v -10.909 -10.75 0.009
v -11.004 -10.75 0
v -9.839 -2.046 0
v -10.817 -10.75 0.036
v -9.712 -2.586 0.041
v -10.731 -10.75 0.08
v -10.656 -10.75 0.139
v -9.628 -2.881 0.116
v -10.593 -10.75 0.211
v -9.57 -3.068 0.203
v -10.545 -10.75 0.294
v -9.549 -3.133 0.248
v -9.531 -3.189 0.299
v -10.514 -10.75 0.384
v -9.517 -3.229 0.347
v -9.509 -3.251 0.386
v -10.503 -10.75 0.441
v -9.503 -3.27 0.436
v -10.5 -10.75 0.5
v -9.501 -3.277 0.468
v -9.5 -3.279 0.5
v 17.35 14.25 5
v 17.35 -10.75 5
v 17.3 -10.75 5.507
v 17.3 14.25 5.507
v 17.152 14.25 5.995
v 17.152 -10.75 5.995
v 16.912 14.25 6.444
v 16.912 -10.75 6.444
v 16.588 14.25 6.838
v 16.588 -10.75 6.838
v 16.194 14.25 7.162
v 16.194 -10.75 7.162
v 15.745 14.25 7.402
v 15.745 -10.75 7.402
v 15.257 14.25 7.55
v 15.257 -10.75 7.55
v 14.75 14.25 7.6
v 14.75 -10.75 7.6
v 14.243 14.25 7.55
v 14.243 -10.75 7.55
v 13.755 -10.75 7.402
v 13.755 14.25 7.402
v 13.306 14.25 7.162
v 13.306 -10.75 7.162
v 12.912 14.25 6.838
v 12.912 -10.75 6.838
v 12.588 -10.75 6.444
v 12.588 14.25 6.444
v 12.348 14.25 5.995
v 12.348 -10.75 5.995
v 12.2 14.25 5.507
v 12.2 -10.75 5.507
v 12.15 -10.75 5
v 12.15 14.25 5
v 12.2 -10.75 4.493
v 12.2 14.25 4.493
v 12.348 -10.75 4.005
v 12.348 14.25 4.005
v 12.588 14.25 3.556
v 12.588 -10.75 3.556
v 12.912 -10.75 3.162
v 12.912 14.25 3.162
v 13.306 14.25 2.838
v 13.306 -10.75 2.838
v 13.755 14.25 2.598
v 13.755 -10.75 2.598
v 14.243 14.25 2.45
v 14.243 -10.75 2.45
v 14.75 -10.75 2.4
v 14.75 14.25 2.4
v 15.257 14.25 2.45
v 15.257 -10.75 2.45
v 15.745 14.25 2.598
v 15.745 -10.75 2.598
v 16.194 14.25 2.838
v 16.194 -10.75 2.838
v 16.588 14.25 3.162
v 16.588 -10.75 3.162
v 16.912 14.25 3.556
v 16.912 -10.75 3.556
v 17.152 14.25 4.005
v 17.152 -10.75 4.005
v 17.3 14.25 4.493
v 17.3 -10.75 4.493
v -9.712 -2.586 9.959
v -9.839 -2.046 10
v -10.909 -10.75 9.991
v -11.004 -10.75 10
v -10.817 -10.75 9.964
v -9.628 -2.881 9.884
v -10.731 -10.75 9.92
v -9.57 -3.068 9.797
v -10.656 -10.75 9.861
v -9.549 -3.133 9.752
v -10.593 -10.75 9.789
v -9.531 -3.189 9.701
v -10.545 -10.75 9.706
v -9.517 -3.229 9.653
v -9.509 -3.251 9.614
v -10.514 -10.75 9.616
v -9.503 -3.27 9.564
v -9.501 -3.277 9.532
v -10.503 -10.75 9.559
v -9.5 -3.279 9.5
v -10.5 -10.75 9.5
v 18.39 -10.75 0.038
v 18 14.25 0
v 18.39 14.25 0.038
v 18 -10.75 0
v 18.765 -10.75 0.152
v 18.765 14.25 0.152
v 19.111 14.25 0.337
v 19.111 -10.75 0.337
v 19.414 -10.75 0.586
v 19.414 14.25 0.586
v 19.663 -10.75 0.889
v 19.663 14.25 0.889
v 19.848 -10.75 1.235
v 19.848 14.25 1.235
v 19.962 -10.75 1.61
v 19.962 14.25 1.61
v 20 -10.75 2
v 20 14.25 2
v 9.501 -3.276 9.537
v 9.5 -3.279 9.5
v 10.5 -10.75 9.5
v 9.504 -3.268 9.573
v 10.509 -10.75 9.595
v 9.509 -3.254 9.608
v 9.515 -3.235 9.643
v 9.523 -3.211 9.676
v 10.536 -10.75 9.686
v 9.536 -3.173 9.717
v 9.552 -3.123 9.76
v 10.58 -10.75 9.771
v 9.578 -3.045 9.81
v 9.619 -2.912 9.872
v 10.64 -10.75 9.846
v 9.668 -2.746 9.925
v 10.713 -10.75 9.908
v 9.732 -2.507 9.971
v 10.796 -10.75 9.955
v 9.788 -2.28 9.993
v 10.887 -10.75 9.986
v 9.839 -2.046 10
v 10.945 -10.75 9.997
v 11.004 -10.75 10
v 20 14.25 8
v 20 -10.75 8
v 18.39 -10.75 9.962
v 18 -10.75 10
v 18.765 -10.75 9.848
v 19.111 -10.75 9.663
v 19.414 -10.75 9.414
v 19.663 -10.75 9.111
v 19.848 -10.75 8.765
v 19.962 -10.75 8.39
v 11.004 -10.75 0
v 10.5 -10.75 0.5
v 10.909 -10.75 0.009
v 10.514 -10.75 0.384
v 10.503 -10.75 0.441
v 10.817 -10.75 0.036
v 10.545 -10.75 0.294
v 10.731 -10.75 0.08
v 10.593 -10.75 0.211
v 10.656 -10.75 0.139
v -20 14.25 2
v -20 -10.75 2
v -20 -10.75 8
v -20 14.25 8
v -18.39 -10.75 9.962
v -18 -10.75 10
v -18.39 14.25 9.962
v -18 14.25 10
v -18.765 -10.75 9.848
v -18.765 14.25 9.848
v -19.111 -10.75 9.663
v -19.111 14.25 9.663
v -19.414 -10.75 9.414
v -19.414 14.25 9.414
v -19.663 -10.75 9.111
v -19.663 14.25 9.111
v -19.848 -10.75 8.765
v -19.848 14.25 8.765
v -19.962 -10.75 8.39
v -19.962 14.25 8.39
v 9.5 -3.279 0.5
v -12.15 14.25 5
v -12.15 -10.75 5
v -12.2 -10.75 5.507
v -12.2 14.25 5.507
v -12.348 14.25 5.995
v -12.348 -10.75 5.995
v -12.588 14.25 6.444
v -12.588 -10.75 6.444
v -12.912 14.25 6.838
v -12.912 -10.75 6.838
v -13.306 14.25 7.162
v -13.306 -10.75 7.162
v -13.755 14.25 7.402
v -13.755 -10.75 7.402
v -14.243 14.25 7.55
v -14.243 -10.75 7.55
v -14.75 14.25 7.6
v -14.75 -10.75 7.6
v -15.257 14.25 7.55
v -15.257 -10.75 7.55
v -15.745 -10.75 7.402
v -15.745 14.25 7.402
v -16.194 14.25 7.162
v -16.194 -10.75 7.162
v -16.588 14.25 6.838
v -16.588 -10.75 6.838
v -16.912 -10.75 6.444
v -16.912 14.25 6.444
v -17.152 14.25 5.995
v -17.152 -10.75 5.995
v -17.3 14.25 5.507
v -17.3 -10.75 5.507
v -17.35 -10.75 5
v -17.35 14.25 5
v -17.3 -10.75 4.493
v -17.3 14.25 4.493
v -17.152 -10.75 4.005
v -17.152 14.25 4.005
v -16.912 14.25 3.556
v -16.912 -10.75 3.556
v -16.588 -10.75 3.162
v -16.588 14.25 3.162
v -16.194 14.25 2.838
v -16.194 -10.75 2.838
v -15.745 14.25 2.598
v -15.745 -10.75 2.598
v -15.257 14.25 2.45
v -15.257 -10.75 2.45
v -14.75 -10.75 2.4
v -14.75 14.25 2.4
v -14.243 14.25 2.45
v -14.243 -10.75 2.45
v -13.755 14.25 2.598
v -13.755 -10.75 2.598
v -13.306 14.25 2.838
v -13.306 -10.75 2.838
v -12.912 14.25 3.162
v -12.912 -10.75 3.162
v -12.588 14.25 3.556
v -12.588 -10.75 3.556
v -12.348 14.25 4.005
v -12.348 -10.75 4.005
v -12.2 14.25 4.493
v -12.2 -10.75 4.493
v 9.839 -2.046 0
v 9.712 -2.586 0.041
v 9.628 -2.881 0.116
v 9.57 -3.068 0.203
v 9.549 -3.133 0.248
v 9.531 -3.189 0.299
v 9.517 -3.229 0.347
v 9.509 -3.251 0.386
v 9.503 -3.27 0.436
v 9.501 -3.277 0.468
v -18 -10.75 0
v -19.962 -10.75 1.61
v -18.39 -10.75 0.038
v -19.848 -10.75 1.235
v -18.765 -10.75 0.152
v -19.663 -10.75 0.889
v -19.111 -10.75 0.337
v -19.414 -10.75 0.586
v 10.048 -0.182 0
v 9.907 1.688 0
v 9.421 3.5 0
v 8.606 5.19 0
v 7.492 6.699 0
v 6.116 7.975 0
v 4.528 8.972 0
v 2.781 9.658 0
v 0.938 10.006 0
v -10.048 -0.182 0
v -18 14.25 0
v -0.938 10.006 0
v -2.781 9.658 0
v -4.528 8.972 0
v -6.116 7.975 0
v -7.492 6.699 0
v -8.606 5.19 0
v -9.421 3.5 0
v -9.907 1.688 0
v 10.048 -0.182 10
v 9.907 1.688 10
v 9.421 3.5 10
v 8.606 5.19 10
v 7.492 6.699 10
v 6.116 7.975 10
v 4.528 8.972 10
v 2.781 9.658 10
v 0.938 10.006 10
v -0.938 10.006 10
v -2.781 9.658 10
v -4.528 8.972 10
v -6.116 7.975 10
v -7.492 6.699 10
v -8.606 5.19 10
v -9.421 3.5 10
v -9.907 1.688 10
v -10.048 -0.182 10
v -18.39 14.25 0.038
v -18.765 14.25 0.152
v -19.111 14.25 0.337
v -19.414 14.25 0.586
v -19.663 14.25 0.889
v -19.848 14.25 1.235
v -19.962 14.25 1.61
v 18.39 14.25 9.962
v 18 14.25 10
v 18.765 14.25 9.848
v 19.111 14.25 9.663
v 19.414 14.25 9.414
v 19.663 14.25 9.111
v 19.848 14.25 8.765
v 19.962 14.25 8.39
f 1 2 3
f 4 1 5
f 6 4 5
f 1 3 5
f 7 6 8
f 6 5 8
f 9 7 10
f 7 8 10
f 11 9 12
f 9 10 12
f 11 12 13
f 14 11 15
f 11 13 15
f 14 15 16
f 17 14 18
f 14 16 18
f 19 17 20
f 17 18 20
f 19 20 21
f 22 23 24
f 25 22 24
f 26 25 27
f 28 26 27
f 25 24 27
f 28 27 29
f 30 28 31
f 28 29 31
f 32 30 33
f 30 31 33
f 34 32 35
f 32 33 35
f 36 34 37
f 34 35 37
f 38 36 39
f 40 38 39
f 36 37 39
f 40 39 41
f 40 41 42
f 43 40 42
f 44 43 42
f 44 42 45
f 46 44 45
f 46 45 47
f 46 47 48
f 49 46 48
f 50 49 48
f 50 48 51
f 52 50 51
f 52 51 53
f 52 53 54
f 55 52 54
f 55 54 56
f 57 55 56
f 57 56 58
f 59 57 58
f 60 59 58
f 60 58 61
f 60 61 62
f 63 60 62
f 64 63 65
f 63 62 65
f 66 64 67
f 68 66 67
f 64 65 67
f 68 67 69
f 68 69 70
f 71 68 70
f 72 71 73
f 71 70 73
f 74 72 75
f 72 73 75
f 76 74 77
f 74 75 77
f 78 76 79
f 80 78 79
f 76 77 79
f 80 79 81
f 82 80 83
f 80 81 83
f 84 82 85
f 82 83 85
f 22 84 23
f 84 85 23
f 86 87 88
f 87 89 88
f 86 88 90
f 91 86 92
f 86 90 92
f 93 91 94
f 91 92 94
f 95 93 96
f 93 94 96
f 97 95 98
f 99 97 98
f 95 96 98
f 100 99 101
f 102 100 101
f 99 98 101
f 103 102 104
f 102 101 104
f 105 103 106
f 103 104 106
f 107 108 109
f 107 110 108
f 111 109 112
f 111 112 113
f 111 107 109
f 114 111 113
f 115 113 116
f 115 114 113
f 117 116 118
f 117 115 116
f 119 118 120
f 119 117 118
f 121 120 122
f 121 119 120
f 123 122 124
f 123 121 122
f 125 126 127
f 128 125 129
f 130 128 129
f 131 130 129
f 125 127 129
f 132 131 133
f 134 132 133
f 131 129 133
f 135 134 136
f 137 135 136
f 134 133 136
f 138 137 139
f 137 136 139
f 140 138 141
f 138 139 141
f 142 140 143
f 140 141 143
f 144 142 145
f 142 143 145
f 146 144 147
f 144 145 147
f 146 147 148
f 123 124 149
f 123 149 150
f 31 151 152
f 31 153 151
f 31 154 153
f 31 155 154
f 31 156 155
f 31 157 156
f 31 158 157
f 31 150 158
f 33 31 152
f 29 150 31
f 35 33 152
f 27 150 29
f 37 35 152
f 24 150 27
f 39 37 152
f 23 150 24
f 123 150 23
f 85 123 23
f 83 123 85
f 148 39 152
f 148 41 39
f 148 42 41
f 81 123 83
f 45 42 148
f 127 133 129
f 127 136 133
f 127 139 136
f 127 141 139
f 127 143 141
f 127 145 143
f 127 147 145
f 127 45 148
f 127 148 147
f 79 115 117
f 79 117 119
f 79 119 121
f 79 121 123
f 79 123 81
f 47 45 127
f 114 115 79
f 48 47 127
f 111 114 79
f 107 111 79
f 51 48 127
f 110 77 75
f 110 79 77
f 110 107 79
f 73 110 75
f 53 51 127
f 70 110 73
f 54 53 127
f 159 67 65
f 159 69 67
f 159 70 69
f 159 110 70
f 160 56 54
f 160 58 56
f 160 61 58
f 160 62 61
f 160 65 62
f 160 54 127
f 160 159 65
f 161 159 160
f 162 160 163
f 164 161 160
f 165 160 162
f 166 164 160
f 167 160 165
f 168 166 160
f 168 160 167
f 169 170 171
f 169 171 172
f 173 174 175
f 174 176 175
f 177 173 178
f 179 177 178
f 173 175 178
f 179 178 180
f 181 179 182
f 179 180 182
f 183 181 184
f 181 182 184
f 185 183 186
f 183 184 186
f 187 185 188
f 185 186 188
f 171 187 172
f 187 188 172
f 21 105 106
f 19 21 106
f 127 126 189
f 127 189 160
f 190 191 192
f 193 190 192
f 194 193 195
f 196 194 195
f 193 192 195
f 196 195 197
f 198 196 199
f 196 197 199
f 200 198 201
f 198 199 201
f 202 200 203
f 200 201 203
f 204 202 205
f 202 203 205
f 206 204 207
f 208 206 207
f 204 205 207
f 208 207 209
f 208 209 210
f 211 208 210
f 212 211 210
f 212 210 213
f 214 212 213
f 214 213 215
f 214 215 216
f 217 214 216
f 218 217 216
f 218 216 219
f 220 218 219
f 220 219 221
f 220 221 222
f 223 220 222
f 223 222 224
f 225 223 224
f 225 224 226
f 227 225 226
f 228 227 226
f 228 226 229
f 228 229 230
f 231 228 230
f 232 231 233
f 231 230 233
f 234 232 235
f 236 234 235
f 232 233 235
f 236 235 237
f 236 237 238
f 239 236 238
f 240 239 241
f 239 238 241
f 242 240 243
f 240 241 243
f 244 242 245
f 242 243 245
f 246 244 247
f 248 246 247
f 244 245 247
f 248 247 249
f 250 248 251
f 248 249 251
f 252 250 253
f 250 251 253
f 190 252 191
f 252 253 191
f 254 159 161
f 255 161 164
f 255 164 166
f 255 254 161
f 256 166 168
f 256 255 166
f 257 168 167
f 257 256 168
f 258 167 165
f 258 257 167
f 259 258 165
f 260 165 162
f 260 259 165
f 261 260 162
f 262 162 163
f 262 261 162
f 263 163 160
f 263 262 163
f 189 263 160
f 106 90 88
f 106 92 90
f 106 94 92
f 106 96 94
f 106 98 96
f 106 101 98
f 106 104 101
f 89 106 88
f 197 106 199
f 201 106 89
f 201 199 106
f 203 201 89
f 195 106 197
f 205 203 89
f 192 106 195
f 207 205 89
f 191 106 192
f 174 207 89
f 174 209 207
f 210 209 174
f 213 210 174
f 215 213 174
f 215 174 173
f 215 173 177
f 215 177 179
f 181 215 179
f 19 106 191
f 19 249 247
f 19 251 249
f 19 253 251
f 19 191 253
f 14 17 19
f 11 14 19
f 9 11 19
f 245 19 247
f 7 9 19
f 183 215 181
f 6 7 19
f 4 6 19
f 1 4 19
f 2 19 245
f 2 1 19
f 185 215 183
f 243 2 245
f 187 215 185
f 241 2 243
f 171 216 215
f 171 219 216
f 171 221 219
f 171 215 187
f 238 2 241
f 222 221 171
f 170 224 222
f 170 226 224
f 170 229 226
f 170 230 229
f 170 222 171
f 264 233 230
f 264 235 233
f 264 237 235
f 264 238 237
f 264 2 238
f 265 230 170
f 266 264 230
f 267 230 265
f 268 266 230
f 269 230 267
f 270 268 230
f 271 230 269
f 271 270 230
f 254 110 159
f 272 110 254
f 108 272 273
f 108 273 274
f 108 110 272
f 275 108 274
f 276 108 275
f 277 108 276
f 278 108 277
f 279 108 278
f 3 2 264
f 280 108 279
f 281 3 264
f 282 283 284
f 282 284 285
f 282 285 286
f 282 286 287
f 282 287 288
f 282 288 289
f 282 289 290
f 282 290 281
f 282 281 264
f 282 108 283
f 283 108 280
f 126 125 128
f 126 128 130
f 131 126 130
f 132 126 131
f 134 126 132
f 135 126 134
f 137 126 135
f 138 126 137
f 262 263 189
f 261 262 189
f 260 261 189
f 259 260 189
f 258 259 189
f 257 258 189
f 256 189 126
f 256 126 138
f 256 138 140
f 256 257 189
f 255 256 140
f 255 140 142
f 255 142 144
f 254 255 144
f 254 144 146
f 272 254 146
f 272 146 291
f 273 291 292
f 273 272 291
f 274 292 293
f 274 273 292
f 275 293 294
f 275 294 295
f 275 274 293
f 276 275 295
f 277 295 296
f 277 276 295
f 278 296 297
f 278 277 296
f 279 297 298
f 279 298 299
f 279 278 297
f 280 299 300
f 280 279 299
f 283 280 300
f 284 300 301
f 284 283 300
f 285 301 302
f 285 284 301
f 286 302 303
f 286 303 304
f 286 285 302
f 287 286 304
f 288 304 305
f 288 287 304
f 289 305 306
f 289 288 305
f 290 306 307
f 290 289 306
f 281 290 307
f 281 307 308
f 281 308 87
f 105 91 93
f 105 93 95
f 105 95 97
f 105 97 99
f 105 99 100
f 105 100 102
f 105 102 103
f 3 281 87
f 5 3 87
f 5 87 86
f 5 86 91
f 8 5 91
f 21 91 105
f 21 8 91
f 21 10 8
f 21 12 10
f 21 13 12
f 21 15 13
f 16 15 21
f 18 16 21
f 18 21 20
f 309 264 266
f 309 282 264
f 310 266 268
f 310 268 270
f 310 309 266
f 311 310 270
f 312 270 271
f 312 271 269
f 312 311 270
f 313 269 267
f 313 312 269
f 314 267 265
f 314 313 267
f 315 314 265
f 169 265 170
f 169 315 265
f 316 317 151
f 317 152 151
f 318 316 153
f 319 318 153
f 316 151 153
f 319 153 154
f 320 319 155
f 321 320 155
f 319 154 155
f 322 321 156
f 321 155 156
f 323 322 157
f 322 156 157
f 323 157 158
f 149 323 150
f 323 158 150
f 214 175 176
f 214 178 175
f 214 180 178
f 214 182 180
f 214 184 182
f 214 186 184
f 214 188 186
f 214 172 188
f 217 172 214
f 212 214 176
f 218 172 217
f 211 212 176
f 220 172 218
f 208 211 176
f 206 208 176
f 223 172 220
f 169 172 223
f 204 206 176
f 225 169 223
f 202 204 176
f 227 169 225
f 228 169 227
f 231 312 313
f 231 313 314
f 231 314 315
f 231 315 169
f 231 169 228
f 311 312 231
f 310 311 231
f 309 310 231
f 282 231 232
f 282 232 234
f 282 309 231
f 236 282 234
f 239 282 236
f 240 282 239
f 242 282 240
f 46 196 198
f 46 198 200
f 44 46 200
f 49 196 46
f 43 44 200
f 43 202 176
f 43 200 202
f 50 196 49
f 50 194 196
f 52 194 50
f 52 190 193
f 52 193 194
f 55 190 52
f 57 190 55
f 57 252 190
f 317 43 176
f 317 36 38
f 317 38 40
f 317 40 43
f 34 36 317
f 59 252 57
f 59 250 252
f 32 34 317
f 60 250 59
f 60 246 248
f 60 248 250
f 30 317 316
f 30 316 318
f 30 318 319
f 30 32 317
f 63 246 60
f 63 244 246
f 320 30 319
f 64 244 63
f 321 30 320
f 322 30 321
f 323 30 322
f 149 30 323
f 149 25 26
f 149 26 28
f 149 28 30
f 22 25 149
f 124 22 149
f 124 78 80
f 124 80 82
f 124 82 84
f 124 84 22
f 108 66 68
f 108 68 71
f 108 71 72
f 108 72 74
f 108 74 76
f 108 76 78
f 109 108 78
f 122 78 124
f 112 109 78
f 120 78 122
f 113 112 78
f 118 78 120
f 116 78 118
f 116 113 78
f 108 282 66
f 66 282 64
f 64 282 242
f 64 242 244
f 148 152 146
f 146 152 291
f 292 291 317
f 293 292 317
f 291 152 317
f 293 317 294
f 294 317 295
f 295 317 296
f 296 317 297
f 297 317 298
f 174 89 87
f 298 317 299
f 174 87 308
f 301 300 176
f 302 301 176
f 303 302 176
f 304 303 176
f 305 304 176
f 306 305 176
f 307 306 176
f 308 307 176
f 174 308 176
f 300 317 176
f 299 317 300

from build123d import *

# Parameters (mm, degrees)
BOSS_EXTRUDE2_DEPTH = 10
SKETCH3_R           = 2.6
CUT_EXTRUDE1_DEPTH  = 34.541019662
FILLET1_R           = 2
CUT_EXTRUDE2_DEPTH  = 27.515325757
FILLET2_R           = 0.5


with BuildPart() as part:
    # Sketch2 → Boss-Extrude2 (new body)
    with BuildSketch(Plane.XY):
        with BuildLine():
            Line((9.5, -10.75), (9.5, -3.279100486))
            ThreePointArc((9.5, -3.279100486), (0, 10.05), (-9.5, -3.279100486))
            Line((-9.5, -3.279100486), (-9.5, -10.75))
            Line((-9.5, -10.75), (-20, -10.75))
            Line((-20, -10.75), (-20, 14.25))
            Line((-20, 14.25), (20, 14.25))
            Line((20, 14.25), (20, -10.75))
            Line((20, -10.75), (9.5, -10.75))
        make_face()
    extrude(amount=BOSS_EXTRUDE2_DEPTH)

    # Sketch3 → Cut-Extrude1 (cut, through all)
    with BuildSketch(Plane.XZ.offset(10.75)):
        with Locations((-14.75, 5)):
            Circle(SKETCH3_R)
        with Locations((14.75, 5)):
            Circle(SKETCH3_R)
    extrude(amount=-CUT_EXTRUDE1_DEPTH, mode=Mode.SUBTRACT)

    # Fillet1
    fillet1_edges = [part.edges().sort_by_distance(p)[0] for p in [
        (20, 1.75, 10),
        (-20, 1.75, 10),
        (-20, 1.75, 0),
        (20, 1.75, 0),
    ]]
    fillet(fillet1_edges, radius=FILLET1_R)

    # Sketch4 → Cut-Extrude2 (cut, through all)
    with BuildSketch(Plane.XY.offset(10)):
        Polygon((-9.5, -10.75), (-9.5, -3.279100486), (-10.5, -10.75), align=None)
        Polygon((9.5, -10.75), (9.5, -3.279100486), (10.5, -10.75), align=None)
    extrude(amount=-CUT_EXTRUDE2_DEPTH, mode=Mode.SUBTRACT)

    # Fillet2
    fillet2_edges = [part.edges().sort_by_distance(p)[0] for p in [
        (-10, -7.014550243, 0),
        (-10, -7.014550243, 10),
        (10, -7.014550243, 0),
        (10, -7.014550243, 10),
    ]]
    fillet(fillet2_edges, radius=FILLET2_R)


solid = part.part
